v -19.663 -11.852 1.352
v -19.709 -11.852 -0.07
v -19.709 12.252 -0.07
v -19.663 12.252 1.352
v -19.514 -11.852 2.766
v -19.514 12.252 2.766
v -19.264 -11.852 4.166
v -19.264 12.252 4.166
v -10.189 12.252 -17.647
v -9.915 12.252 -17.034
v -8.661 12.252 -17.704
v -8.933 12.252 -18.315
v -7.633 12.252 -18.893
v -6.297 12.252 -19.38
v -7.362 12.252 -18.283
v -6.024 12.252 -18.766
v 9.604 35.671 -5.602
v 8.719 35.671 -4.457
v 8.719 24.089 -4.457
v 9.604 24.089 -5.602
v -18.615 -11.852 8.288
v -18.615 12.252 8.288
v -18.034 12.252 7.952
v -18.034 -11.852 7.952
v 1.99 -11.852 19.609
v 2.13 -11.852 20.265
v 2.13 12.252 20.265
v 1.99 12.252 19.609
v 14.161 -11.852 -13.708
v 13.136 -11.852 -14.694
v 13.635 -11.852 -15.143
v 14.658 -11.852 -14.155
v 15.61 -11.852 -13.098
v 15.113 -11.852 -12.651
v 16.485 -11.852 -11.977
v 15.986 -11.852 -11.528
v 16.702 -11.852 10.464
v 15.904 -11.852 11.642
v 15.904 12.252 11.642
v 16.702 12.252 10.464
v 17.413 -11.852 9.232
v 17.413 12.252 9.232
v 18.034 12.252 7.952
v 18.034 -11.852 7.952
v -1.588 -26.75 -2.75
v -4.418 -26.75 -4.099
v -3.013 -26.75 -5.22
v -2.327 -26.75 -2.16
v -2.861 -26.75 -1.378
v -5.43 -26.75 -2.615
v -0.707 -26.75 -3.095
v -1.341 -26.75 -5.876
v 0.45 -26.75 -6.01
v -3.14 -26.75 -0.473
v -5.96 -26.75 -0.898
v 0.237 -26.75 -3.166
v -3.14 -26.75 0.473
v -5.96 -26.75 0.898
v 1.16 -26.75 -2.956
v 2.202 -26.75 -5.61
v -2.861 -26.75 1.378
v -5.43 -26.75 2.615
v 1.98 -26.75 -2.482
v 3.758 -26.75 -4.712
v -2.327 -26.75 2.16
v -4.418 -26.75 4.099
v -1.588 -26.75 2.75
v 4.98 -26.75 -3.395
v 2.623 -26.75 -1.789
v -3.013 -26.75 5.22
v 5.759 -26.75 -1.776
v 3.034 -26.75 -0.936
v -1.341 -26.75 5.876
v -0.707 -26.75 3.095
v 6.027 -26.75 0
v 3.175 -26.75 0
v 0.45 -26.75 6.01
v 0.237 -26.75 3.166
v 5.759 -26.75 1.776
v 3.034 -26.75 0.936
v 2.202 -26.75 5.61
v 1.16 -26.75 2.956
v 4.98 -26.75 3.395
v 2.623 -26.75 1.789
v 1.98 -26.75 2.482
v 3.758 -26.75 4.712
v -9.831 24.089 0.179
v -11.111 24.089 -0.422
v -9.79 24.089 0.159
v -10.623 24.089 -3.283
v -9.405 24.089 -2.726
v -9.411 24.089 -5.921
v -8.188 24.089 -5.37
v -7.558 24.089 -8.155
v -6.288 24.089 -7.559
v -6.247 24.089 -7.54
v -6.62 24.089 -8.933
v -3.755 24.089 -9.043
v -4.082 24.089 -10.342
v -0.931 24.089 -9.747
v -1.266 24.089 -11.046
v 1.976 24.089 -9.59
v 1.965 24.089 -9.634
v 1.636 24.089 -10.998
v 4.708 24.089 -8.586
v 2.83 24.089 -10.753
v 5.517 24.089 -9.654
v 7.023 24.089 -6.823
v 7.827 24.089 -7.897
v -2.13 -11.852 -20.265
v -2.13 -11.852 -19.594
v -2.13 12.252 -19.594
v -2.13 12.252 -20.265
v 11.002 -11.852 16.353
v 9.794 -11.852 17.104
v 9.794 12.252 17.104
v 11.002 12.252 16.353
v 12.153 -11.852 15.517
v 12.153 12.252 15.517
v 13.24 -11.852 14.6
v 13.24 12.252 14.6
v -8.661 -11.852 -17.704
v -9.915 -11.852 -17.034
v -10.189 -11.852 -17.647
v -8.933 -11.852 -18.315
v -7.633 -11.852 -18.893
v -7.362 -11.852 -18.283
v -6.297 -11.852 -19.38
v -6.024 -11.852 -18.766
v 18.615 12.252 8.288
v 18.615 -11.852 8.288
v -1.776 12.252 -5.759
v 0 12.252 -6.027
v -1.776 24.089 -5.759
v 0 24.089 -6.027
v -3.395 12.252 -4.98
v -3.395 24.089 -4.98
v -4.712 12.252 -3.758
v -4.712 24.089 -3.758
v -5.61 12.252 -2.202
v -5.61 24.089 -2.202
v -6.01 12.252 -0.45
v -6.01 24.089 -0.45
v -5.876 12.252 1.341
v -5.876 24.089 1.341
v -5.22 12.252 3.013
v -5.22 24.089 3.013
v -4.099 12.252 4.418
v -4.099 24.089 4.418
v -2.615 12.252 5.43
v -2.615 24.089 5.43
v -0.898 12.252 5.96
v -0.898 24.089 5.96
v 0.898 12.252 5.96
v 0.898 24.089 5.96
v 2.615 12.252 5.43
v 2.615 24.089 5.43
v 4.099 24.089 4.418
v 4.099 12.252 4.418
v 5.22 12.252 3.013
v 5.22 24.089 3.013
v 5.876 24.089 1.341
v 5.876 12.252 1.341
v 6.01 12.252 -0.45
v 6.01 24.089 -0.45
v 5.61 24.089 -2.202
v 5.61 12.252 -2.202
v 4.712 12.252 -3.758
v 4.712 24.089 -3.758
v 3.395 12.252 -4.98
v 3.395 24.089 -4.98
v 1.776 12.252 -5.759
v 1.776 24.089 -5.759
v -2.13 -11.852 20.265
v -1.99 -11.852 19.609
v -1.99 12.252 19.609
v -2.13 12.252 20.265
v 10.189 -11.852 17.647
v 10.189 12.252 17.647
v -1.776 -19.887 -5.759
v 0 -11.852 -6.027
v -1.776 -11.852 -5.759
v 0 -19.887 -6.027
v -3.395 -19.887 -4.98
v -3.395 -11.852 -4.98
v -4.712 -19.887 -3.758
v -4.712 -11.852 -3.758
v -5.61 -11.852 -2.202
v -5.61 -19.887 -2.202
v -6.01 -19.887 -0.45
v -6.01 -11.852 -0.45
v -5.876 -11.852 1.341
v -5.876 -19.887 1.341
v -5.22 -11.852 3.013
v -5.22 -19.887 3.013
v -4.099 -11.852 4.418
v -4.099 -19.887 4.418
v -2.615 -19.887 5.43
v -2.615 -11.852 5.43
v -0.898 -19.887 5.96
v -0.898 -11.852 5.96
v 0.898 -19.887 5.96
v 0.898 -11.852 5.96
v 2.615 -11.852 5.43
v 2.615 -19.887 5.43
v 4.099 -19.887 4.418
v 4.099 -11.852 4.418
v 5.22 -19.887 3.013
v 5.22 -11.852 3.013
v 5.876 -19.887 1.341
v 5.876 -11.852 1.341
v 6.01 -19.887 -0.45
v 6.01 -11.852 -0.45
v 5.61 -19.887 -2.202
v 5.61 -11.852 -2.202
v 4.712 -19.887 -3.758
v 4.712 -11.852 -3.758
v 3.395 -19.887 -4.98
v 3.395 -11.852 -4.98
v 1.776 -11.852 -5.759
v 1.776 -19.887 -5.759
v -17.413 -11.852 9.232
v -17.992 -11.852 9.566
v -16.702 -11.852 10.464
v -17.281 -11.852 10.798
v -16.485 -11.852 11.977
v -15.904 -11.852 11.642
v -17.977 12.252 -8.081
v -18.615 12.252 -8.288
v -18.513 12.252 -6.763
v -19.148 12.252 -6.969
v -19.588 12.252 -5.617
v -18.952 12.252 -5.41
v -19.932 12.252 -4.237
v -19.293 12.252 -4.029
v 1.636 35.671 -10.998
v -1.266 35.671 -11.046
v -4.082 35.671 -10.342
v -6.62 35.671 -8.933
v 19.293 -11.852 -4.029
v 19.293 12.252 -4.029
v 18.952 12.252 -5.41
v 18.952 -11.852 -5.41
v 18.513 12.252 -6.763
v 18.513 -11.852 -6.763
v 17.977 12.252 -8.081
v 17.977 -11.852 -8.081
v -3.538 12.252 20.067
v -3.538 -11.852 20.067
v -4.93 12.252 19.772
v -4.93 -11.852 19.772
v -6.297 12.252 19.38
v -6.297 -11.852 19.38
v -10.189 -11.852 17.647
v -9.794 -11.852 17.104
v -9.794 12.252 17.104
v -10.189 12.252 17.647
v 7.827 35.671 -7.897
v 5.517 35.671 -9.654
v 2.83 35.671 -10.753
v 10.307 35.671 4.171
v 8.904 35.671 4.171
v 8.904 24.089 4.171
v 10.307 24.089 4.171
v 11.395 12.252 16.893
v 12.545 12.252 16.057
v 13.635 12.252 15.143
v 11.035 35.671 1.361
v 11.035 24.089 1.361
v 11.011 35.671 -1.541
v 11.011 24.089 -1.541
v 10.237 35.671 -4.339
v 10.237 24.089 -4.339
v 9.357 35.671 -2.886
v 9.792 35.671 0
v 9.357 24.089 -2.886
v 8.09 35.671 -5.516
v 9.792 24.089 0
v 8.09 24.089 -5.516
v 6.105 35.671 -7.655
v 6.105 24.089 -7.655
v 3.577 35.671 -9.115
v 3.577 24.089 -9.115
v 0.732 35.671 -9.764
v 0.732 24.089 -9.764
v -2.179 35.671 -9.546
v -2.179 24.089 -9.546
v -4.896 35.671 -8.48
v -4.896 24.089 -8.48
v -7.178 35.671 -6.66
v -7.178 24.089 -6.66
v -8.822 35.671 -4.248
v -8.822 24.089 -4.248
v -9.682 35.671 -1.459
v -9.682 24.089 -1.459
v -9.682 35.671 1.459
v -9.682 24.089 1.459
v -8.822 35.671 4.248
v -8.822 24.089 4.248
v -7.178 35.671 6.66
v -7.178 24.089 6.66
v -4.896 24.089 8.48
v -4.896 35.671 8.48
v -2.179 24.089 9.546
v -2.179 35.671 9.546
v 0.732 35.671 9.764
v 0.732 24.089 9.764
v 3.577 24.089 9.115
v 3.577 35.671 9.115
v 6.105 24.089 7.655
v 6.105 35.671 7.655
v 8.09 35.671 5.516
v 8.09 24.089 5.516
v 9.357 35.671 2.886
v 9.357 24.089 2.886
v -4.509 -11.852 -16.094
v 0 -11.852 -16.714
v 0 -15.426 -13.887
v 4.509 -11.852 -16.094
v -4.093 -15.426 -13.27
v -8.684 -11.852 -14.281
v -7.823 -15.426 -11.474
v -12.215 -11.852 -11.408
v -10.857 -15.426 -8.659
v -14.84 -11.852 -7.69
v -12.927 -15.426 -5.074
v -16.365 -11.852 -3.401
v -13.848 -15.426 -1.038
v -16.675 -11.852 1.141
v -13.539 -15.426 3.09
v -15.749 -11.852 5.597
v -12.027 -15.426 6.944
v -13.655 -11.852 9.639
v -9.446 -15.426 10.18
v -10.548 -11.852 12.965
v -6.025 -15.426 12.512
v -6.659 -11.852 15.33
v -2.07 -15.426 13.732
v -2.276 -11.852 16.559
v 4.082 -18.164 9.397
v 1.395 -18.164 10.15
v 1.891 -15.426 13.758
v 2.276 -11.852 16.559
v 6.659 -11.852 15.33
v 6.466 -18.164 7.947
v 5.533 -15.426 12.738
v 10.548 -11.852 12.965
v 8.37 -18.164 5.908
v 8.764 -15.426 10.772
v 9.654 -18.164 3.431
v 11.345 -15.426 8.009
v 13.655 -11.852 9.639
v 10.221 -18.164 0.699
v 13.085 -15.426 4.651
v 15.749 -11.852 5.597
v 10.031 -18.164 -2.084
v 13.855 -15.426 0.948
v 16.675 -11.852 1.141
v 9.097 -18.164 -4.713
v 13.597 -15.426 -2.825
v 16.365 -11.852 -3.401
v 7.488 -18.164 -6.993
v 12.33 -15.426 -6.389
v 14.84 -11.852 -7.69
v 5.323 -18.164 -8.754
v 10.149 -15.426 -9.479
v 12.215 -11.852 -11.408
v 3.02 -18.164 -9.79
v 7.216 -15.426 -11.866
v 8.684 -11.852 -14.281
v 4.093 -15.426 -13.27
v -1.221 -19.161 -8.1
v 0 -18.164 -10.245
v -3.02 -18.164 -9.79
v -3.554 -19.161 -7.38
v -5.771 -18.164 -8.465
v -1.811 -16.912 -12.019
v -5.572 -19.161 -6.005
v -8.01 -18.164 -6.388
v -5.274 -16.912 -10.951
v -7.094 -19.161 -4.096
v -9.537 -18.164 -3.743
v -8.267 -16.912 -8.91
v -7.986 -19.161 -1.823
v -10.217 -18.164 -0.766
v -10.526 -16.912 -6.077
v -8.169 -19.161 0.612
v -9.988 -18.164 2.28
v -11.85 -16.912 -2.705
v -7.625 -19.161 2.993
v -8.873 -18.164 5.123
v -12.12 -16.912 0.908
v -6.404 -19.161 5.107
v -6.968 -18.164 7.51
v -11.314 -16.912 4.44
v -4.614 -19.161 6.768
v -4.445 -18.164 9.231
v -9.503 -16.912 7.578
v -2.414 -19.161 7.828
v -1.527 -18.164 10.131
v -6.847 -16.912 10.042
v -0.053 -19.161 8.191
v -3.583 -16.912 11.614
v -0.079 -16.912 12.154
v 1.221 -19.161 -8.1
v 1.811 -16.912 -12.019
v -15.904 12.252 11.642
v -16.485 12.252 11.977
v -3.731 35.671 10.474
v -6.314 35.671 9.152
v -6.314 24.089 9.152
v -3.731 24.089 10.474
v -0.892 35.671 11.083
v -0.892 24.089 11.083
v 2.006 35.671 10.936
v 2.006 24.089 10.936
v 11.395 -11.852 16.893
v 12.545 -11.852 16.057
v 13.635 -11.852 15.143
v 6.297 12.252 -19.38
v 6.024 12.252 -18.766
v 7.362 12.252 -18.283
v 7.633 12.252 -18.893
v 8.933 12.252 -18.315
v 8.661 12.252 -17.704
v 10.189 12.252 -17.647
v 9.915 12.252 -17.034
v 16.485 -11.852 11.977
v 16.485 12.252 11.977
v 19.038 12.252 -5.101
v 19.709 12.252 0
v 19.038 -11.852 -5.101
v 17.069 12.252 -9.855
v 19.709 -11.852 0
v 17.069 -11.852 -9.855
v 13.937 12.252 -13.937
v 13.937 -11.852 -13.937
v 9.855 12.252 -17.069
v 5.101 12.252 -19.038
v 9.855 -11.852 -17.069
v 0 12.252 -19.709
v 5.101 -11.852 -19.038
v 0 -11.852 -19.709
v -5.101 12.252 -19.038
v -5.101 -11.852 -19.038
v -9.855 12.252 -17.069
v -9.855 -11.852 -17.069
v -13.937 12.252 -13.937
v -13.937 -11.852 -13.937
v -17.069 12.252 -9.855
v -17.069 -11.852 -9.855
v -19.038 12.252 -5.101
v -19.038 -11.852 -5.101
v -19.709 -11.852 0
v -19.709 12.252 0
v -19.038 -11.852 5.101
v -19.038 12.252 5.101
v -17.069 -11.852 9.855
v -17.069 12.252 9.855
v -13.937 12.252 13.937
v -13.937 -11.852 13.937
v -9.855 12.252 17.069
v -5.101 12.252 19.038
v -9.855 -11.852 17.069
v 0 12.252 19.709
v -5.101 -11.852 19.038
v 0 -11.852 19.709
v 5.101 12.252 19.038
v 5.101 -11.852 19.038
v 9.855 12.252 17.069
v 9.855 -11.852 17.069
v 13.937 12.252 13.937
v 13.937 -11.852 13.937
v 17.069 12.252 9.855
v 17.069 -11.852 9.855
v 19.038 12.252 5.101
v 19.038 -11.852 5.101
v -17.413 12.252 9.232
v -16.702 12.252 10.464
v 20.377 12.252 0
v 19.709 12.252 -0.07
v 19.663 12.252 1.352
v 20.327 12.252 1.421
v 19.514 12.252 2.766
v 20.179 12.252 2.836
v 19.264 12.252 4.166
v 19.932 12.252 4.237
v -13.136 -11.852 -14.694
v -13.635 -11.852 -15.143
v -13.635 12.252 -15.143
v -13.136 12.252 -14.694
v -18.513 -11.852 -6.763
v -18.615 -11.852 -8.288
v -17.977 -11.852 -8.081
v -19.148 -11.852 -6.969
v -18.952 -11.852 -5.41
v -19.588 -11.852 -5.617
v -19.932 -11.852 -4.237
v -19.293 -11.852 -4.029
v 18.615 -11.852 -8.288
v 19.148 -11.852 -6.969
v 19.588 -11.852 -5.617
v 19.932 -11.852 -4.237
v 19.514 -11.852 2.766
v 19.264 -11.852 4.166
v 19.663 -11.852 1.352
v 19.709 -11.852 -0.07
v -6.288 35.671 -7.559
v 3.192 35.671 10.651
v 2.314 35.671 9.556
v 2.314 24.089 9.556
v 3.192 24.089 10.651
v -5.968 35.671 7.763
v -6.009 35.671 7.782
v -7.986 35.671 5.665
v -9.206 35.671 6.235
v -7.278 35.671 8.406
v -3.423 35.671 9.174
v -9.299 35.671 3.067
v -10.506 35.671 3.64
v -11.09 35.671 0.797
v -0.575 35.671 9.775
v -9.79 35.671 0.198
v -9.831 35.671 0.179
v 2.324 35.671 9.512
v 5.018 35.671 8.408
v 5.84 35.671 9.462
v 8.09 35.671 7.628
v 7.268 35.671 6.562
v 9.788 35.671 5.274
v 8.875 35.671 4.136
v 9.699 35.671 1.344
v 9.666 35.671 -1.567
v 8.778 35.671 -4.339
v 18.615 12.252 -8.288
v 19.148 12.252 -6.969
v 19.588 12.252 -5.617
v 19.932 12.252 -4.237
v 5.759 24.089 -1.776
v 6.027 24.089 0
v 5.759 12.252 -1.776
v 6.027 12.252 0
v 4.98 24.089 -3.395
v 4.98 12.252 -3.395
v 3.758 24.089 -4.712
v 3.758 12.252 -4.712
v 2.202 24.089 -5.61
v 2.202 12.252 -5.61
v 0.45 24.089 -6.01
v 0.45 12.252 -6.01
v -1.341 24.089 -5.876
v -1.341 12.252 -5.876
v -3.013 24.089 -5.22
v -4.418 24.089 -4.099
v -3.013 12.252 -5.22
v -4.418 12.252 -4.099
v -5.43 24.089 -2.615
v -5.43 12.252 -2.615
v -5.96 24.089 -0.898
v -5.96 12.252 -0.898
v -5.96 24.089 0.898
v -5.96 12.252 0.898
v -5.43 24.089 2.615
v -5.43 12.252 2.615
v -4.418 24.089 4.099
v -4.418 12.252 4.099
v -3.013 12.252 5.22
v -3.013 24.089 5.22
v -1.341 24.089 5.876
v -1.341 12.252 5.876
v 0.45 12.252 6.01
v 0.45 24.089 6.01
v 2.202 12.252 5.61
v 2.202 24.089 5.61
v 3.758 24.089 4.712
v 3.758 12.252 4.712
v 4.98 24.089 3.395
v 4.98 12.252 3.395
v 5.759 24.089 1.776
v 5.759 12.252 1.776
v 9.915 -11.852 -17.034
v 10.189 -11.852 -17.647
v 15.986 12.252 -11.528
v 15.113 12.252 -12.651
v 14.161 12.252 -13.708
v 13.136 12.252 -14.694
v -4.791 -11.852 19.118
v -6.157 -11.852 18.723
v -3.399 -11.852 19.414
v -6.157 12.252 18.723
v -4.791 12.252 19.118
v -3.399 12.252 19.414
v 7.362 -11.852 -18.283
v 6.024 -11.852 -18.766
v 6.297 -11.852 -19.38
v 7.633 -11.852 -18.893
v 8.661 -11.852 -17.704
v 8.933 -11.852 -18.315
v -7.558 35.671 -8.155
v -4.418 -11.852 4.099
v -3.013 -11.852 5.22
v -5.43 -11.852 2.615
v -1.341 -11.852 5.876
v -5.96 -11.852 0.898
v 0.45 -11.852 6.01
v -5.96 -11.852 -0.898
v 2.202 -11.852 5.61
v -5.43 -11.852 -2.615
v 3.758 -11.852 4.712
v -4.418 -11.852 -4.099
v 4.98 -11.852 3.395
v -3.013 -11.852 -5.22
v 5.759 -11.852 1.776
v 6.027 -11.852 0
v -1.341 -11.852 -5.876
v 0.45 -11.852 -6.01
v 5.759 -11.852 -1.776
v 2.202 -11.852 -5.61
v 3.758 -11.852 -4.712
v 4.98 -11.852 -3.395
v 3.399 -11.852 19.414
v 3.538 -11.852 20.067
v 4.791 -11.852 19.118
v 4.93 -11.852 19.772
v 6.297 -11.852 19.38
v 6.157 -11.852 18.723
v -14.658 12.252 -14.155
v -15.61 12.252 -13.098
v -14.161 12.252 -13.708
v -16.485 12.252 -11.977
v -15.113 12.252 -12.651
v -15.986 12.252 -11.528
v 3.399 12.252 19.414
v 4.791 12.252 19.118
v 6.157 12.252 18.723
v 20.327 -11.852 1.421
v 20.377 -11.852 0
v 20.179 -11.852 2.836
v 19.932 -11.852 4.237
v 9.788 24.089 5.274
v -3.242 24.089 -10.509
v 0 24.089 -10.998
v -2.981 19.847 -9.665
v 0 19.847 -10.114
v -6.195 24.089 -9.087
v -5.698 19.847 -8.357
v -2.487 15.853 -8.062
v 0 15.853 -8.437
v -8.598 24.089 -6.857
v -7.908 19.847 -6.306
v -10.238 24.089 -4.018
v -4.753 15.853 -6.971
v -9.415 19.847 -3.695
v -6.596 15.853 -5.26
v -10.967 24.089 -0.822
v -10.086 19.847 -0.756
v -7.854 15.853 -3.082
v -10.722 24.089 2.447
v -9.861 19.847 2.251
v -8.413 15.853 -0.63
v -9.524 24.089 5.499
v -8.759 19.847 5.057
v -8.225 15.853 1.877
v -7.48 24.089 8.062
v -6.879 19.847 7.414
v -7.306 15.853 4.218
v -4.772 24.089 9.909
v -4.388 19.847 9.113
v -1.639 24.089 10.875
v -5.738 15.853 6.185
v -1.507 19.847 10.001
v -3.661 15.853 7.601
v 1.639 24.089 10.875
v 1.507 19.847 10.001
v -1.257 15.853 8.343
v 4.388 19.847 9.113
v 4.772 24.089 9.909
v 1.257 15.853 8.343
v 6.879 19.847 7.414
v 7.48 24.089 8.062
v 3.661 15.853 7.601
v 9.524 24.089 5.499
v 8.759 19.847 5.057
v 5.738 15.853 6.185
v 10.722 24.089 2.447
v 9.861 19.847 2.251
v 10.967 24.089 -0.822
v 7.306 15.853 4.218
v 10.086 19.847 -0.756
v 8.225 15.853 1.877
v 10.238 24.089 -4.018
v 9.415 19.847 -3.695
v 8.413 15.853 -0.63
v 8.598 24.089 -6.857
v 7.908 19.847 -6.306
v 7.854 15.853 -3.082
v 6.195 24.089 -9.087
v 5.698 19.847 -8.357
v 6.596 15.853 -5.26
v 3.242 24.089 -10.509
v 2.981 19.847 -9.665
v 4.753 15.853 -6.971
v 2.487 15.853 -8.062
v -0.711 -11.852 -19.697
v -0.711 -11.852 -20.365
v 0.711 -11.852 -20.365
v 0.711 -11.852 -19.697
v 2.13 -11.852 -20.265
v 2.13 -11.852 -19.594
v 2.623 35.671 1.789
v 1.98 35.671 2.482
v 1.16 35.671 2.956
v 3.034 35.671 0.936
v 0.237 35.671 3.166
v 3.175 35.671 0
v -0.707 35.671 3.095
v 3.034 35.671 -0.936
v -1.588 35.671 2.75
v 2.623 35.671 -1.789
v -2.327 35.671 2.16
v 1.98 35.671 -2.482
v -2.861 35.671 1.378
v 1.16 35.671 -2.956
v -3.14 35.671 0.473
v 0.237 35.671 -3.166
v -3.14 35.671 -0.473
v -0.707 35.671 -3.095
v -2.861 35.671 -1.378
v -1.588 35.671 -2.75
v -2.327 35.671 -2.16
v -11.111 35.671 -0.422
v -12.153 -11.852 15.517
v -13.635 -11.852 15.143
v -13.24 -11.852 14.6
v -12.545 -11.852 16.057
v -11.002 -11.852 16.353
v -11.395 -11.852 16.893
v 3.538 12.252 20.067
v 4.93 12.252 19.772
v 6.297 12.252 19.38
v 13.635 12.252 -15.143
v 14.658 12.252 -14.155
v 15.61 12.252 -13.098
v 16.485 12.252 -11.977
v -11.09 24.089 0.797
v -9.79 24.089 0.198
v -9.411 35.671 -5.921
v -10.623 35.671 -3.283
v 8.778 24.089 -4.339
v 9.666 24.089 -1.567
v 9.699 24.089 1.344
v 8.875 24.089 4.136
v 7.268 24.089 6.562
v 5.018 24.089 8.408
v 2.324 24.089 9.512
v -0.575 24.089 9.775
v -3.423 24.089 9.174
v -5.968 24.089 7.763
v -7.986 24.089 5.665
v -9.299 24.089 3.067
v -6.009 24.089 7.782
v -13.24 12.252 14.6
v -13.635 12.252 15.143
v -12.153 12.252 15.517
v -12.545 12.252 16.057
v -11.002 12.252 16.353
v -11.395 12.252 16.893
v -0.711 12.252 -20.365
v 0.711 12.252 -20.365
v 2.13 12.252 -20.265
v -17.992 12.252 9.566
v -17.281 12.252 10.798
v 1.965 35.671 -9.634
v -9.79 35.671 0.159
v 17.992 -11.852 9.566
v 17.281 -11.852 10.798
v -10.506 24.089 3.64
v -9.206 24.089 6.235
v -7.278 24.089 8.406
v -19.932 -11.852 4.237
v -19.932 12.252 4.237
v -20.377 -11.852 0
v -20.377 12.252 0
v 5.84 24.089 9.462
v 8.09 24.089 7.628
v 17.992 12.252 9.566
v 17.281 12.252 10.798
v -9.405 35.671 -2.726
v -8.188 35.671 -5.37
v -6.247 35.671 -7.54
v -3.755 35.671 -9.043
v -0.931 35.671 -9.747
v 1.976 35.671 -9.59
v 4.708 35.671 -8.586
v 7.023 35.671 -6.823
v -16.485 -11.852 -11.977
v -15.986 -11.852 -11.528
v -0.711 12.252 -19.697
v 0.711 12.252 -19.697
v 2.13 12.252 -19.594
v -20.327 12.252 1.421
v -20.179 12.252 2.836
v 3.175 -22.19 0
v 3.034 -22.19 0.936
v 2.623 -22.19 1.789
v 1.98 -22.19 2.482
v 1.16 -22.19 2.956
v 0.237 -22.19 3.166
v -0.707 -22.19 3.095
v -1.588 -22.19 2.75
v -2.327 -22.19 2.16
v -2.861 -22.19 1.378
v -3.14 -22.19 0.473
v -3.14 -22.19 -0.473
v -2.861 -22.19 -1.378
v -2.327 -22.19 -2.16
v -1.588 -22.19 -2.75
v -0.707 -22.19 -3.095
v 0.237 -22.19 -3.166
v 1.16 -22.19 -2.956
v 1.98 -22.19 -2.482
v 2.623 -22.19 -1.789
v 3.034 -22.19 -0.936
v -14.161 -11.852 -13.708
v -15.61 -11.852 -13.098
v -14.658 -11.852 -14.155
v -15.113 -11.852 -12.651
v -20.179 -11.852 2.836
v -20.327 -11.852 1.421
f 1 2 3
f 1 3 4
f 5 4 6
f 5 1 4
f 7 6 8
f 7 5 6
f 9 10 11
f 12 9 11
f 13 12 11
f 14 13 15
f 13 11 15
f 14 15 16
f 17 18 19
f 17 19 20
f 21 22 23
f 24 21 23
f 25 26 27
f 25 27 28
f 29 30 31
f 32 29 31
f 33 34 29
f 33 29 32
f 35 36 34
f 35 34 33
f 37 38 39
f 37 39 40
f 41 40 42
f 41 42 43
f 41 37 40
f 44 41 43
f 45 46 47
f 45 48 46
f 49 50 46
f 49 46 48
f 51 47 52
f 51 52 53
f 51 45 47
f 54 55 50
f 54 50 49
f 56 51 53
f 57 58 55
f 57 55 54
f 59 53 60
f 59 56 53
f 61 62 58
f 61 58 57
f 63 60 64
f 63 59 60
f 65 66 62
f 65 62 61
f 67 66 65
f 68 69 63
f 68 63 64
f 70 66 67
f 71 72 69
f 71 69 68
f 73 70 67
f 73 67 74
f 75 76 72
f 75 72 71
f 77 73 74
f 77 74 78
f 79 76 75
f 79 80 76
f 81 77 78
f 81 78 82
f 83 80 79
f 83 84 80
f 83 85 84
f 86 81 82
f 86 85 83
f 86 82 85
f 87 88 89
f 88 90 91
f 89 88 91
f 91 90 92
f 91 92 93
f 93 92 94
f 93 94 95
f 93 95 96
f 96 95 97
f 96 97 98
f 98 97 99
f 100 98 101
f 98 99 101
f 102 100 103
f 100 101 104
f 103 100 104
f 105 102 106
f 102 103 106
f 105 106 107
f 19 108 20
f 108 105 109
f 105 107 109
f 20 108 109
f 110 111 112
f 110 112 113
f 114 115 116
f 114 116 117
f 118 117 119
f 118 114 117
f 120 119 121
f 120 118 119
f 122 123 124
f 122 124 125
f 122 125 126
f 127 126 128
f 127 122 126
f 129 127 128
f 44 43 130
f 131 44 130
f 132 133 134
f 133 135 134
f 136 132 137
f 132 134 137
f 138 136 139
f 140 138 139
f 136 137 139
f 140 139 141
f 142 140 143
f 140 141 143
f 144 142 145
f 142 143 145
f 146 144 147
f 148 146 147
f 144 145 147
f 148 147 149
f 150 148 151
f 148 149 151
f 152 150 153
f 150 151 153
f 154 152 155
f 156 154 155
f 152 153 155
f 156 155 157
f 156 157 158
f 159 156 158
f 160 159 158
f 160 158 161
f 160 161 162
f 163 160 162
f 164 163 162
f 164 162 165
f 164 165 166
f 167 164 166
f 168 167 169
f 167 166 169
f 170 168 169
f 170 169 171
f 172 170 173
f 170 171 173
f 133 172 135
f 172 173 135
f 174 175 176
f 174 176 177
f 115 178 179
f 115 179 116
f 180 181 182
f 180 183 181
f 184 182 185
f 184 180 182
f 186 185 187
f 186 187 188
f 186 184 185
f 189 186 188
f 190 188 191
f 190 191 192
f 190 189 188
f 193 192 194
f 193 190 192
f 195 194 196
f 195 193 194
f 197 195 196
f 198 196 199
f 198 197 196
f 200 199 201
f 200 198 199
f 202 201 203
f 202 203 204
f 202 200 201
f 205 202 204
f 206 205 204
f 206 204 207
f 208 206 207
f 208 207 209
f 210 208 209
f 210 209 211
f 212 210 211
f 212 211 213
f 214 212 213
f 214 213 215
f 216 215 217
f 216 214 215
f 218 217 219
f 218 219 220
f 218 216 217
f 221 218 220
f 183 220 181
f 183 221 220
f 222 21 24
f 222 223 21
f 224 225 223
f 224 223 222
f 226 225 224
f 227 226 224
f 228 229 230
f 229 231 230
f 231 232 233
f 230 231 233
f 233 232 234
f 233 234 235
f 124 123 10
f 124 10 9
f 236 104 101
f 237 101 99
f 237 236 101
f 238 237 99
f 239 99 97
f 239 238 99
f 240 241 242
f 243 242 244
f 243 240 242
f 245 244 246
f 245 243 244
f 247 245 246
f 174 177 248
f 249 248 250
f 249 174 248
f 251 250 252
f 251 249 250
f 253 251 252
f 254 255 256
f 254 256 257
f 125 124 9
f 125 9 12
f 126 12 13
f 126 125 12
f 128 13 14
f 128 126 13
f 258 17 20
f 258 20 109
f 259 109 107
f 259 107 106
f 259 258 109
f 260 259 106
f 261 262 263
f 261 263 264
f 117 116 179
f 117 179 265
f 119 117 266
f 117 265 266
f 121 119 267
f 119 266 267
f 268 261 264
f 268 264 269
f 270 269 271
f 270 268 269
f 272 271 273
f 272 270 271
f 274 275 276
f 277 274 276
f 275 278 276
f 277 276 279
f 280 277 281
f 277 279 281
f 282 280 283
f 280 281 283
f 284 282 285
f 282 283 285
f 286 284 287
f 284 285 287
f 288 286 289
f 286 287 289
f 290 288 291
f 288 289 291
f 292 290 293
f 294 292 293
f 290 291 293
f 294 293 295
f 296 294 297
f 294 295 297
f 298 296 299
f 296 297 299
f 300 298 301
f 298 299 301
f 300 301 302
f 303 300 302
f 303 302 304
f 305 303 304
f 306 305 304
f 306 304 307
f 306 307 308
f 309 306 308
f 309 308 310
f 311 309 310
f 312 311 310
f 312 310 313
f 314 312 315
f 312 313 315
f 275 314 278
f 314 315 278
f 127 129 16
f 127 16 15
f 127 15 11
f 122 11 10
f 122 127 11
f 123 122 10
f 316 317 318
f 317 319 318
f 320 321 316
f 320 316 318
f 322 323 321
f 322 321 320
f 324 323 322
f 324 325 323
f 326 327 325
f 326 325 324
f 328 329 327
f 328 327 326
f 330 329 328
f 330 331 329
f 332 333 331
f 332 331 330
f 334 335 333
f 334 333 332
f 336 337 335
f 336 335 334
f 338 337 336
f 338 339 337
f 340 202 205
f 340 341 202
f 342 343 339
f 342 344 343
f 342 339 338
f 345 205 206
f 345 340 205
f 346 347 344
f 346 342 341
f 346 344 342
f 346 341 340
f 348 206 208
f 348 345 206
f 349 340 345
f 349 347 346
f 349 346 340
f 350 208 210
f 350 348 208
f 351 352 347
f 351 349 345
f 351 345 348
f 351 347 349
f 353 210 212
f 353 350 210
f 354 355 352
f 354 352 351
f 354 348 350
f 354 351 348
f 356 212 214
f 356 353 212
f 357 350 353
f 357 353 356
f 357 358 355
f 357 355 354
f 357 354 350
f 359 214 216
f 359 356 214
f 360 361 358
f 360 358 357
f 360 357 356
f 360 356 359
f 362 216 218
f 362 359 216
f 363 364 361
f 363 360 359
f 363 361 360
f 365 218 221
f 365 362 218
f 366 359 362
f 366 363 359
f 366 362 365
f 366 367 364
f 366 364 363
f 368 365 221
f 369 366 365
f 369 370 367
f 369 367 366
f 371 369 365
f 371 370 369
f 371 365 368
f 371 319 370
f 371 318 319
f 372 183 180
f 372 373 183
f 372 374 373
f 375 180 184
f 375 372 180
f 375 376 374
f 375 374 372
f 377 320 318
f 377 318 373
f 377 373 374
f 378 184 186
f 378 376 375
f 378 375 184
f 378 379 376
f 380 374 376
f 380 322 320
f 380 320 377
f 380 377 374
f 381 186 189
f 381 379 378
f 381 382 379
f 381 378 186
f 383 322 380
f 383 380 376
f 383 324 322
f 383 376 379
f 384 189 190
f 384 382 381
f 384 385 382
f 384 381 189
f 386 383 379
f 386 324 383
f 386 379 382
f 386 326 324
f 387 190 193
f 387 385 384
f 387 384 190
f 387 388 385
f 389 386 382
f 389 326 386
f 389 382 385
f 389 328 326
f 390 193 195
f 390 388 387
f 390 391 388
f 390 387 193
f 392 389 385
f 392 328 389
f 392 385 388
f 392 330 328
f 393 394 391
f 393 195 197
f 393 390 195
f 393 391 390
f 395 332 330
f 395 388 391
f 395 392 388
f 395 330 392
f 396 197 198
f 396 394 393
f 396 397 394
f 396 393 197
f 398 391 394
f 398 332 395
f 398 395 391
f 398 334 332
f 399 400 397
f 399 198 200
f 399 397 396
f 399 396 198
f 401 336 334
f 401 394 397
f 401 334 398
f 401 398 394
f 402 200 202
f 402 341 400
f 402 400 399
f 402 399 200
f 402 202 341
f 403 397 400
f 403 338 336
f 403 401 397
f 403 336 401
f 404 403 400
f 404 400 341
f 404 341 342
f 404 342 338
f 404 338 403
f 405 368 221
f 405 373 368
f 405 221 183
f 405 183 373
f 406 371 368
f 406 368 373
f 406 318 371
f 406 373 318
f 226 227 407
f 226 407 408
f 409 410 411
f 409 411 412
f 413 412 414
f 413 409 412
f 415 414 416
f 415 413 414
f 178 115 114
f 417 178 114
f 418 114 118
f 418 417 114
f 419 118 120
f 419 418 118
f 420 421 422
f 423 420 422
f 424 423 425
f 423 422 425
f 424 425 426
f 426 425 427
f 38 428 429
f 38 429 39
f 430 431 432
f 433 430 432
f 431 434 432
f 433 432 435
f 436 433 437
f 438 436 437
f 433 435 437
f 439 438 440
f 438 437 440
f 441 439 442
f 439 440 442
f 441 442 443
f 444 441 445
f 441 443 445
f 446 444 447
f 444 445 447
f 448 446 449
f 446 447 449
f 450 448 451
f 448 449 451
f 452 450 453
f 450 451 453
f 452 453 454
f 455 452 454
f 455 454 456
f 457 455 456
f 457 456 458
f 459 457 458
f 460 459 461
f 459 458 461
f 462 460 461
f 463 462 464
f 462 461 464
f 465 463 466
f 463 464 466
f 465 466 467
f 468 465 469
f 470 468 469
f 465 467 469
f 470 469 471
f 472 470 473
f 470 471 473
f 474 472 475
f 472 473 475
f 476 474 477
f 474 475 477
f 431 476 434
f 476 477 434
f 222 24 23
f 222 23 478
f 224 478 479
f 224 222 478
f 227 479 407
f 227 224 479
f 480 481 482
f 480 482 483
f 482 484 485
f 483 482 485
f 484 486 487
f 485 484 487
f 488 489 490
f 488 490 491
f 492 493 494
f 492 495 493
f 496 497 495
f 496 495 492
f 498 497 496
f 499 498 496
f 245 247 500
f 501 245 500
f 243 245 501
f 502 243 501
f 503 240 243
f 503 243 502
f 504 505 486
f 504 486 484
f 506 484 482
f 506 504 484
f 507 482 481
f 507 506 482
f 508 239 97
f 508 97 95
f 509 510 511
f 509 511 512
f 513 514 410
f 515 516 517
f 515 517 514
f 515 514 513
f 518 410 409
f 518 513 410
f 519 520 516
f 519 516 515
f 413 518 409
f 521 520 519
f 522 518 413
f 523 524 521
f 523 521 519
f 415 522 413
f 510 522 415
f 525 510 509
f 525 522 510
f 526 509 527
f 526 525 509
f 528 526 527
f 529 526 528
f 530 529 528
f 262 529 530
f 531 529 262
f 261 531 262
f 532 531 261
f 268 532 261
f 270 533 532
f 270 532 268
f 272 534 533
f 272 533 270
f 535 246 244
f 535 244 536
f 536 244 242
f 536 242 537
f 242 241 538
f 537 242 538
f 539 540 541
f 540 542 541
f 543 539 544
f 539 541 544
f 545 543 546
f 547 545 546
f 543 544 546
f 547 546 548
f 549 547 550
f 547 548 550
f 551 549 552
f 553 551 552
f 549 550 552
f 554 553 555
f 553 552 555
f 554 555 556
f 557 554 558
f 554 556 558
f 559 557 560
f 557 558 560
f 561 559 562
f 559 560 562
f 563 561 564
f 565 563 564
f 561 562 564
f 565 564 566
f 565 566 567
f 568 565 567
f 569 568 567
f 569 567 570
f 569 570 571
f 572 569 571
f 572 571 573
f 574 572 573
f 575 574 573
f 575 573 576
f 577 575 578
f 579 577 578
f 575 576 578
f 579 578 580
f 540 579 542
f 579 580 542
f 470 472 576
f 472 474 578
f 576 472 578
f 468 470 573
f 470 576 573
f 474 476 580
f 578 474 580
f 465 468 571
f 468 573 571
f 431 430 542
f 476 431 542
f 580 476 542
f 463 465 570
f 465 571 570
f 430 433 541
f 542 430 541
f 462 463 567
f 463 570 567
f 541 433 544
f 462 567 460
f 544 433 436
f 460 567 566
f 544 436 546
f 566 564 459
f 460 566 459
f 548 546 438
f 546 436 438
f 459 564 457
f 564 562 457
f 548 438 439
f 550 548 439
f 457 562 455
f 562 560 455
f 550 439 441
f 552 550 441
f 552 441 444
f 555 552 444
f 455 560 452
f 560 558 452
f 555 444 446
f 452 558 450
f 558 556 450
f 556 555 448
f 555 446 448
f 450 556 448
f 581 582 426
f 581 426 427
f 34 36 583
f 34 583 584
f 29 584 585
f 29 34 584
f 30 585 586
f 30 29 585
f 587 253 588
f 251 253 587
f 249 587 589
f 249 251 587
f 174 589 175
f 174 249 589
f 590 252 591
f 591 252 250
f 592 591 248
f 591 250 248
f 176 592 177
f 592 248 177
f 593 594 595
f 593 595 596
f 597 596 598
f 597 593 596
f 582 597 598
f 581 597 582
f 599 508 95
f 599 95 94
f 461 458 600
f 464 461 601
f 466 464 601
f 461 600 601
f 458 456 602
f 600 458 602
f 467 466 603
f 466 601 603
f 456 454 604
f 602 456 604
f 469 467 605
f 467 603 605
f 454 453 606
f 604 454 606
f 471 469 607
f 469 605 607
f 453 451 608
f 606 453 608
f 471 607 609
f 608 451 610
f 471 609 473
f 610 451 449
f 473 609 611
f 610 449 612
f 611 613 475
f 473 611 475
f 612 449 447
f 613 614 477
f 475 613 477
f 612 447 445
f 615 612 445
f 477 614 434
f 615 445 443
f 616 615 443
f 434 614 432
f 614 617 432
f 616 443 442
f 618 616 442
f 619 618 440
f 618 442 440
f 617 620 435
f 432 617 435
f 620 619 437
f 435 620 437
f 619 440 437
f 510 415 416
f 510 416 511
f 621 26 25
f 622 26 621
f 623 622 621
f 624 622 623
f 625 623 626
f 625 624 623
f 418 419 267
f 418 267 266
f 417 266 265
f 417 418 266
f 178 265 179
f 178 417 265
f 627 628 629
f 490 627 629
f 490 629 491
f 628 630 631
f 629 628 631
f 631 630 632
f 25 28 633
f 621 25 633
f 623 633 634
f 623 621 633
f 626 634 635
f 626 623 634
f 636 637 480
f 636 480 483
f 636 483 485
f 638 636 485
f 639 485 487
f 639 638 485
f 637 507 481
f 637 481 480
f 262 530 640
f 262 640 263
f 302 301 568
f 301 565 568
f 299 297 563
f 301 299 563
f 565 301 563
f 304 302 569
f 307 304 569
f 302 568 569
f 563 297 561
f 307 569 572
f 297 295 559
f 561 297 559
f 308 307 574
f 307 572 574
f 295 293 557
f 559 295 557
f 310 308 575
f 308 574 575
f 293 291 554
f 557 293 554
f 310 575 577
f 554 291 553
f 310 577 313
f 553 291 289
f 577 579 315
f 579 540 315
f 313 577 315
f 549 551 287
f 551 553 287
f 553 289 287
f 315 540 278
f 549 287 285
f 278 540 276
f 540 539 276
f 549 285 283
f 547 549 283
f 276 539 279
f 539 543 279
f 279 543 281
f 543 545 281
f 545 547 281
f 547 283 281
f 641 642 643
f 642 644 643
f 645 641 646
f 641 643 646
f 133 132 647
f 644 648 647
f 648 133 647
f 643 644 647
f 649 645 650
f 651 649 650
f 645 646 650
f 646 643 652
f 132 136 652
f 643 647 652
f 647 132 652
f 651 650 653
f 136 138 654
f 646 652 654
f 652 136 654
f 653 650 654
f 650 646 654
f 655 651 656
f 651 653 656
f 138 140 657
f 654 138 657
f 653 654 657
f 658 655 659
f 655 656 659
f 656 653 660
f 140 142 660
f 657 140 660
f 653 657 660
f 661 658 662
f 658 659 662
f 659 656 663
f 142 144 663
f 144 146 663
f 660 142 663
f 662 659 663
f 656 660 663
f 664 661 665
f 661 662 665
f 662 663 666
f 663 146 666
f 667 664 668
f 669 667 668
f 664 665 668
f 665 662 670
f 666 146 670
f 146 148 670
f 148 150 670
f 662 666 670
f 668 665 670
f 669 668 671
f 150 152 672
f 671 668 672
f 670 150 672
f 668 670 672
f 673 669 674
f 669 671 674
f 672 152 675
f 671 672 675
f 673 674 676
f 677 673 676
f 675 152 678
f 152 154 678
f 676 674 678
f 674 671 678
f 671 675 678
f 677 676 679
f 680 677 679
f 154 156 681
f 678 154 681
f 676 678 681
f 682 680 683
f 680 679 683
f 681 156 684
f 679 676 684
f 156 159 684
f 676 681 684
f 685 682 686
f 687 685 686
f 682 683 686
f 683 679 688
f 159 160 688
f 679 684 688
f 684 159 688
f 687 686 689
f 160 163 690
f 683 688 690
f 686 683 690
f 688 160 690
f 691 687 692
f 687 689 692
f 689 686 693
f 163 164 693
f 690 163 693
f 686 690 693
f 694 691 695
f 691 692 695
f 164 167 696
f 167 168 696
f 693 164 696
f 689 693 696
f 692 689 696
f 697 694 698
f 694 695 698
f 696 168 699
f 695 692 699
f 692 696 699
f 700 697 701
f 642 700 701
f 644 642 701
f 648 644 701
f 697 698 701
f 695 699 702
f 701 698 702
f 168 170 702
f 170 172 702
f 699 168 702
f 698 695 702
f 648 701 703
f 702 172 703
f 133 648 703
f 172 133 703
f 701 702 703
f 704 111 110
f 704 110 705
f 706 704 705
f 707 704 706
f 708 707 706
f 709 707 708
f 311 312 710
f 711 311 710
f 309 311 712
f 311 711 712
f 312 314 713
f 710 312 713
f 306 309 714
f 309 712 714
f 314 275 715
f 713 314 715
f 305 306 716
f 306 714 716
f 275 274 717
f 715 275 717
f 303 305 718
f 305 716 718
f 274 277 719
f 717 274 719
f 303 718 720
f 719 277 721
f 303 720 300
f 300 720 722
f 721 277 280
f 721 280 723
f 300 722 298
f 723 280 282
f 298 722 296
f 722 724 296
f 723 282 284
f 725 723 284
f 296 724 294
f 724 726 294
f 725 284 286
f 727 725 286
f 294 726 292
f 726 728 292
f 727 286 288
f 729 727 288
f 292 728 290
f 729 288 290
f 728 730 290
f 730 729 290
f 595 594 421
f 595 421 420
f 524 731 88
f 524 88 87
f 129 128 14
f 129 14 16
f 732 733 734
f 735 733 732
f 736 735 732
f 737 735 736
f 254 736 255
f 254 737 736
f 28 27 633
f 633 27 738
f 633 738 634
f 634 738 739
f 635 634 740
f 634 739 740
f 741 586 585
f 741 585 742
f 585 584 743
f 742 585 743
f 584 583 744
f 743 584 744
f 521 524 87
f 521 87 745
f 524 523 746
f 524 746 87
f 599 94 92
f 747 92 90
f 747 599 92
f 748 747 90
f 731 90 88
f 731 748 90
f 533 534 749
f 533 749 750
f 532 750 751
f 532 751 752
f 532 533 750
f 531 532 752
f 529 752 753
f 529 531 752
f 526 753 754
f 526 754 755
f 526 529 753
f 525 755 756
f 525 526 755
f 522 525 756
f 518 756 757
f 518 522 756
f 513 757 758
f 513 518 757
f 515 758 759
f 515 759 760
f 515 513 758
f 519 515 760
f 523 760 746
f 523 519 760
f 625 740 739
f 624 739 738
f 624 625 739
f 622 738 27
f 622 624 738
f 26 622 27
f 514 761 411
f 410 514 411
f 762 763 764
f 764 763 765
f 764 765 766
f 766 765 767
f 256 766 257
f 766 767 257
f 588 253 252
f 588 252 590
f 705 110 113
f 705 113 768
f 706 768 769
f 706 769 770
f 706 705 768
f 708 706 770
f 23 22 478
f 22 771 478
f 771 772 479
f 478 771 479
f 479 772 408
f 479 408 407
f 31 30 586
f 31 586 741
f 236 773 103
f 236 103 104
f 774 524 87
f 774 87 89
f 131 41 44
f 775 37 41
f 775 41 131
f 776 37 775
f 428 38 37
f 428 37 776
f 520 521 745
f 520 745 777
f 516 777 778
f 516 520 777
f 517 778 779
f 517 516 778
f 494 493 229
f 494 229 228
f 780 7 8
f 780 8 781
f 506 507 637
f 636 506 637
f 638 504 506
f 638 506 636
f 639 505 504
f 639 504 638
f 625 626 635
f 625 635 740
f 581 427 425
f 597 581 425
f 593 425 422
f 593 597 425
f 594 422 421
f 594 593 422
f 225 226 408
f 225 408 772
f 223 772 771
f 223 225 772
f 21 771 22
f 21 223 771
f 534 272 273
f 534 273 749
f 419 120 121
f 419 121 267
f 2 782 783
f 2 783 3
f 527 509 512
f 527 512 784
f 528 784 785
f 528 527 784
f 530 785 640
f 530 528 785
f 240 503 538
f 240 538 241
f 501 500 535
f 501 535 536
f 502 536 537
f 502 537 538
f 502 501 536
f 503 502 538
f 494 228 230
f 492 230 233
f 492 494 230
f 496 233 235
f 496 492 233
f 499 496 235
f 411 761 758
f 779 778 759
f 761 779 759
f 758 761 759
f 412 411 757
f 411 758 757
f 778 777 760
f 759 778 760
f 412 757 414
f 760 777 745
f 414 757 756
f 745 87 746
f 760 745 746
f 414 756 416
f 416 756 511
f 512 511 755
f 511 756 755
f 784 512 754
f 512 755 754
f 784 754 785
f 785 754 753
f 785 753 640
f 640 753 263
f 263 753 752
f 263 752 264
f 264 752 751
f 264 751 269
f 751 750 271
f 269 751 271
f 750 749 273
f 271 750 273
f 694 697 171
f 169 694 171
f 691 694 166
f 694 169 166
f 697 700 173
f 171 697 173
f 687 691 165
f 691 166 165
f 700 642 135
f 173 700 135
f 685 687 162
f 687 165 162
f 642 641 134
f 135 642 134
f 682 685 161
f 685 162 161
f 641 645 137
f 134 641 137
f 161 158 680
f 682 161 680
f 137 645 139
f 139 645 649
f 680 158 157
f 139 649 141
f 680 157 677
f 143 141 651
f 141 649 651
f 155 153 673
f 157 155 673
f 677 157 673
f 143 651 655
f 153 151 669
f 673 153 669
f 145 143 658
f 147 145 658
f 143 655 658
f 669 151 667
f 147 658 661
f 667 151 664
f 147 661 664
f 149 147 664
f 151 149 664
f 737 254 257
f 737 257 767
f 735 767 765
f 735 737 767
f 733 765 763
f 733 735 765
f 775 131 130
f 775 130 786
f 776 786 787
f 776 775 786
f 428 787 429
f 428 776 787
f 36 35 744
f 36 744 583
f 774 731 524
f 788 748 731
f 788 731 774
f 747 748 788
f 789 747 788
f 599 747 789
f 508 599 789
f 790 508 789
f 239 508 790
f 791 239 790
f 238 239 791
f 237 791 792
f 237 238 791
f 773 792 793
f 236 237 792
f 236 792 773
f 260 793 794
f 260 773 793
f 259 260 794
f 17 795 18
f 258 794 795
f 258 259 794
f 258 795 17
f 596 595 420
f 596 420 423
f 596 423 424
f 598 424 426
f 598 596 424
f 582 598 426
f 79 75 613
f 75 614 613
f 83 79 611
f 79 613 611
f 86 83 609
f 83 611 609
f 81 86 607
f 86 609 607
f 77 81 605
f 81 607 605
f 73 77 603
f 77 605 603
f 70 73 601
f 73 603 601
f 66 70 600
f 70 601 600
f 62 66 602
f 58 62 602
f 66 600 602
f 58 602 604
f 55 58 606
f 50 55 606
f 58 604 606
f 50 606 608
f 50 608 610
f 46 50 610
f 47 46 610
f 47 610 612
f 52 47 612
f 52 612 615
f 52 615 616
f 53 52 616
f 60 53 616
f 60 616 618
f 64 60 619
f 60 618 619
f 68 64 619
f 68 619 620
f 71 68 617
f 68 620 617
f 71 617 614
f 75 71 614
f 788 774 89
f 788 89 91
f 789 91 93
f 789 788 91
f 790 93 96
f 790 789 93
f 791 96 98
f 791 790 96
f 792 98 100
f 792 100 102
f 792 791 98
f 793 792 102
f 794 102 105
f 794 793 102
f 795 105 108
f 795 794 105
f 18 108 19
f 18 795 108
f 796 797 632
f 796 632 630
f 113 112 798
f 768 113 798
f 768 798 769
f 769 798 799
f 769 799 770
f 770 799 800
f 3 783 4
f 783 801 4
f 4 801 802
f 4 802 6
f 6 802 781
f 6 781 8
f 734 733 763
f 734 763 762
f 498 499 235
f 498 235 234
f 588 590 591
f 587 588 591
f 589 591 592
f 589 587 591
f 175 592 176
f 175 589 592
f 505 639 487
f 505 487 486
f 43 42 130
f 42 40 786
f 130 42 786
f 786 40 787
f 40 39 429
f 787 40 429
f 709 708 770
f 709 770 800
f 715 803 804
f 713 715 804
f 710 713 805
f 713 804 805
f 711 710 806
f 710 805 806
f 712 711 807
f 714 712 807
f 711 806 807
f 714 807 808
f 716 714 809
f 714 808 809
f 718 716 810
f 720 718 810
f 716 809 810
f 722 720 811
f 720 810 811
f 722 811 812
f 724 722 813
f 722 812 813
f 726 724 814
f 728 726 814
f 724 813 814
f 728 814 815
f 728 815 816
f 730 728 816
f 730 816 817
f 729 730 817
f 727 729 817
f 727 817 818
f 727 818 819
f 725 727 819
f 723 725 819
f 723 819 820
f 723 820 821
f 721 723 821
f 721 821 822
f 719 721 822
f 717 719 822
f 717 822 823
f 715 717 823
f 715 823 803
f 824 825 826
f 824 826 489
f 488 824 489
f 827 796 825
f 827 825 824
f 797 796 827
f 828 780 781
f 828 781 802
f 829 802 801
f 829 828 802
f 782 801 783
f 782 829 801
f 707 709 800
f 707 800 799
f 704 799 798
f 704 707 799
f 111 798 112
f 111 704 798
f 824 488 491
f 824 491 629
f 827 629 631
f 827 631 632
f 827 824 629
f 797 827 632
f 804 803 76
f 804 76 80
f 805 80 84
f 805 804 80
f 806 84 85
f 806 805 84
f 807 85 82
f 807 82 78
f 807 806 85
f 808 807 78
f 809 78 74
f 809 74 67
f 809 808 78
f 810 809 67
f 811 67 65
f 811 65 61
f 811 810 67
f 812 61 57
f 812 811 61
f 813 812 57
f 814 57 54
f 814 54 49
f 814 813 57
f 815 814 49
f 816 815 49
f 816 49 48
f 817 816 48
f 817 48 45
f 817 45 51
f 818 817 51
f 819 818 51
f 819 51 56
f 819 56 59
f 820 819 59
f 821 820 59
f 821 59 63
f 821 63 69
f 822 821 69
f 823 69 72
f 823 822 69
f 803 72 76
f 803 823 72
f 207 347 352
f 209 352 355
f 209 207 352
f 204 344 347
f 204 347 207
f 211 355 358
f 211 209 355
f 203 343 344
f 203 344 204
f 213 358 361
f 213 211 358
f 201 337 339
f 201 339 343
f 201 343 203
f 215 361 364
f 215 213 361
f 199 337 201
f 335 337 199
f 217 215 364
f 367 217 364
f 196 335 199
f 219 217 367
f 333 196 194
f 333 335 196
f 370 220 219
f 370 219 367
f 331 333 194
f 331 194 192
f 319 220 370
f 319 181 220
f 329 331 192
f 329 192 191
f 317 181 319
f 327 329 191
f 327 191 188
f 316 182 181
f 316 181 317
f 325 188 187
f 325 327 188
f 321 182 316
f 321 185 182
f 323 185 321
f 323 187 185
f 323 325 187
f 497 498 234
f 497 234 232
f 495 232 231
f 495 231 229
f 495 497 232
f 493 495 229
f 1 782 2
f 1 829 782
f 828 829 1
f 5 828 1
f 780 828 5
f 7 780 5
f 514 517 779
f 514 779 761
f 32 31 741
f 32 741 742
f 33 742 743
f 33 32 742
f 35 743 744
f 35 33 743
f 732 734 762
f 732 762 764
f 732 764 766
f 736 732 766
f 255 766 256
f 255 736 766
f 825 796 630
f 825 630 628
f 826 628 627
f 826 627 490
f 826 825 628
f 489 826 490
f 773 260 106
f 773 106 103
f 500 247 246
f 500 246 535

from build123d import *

# Parameters (mm, degrees)
SKETCH2_R               = 3.175
CUT_EXTRUDE1_DEPTH      = 1
CUT_EXTRUDE1_DEPTH_BACK = 58.8612
BOSS_EXTRUDE2_DEPTH     = 24.1046
BOSS_EXTRUDE2_2_DEPTH   = 24.1046
BOSS_EXTRUDE2_3_DEPTH   = 24.1046
BOSS_EXTRUDE2_4_DEPTH   = 24.1046
BOSS_EXTRUDE2_5_DEPTH   = 24.1046
BOSS_EXTRUDE2_6_DEPTH   = 24.1046
BOSS_EXTRUDE2_7_DEPTH   = 24.1046
BOSS_EXTRUDE2_8_DEPTH   = 24.1046
BOSS_EXTRUDE2_9_DEPTH   = 24.1046
BOSS_EXTRUDE2_10_DEPTH  = 24.1046
BOSS_EXTRUDE2_11_DEPTH  = 24.1046
BOSS_EXTRUDE2_12_DEPTH  = 24.1046
BOSS_EXTRUDE2_13_DEPTH  = 24.1046
BOSS_EXTRUDE2_14_DEPTH  = 24.1046
BOSS_EXTRUDE2_15_DEPTH  = 24.1046
BOSS_EXTRUDE4_DEPTH     = 11.5824
BOSS_EXTRUDE4_2_DEPTH   = 11.5824
SKETCH7_R               = 6.02698233
SKETCH7_R_2             = 3.175
BOSS_EXTRUDE5_DEPTH     = 4.5593


with BuildPart() as part:
    # Sketch1 → Revolve1 (revolve)
    with BuildSketch(Plane.XY):
        Polygon((3.398475252, -22.190292446), (0, -22.190292446), (0, 35.670907554), (9.7917, 35.670907554), (9.7917, 24.088507554), (6.02698233, 24.088507554), (6.02698233, 12.252107554), (19.709387233, 12.252107554), (19.709387233, -11.852492446), (6.02698233, -11.852492446), (6.02698233, -22.190292446), align=None)
    revolve(axis=Axis((0, -22.190292446, 0), (0, 1, 0)))

    # Sketch2 → Cut-Extrude1 (cut, two sides)
    with BuildSketch(Plane.XZ.offset(22.190292446)) as cut_extrude1_sk:
        Circle(SKETCH2_R)
    extrude(amount=CUT_EXTRUDE1_DEPTH, mode=Mode.SUBTRACT)
    extrude(cut_extrude1_sk.sketch, amount=-CUT_EXTRUDE1_DEPTH_BACK, mode=Mode.SUBTRACT)

    # Sketch7 → Boss-Extrude5 (add)
    with BuildSketch(Plane.XZ.offset(22.190292446)):
        Circle(SKETCH7_R)
        Circle(SKETCH7_R_2, mode=Mode.SUBTRACT)
    extrude(amount=BOSS_EXTRUDE5_DEPTH)


with BuildPart() as body_2:
    # Sketch3 → Boss-Extrude2 (new body)
    with BuildSketch(Plane.XZ.offset(11.852492446)):
        with BuildLine():
            Line((2.129978383, -20.26539062), (2.129978383, -19.59395665))
            ThreePointArc((2.129978383, -19.59395665), (0, -19.709387233), (-2.129978383, -19.59395665))
            Line((-2.129978383, -19.59395665), (-2.129978383, -20.26539062))
            ThreePointArc((-2.129978383, -20.26539062), (0, -20.377018057), (2.129978383, -20.26539062))
        make_face()
    extrude(amount=-BOSS_EXTRUDE2_DEPTH)


with BuildPart() as body_3:
    # Sketch3 → Boss-Extrude2 2 (new body)
    with BuildSketch(Plane.XZ.offset(11.852492446)):
        with BuildLine():
            Line((-6.296844874, -19.379695806), (-6.023748075, -18.766310352))
            ThreePointArc((-6.023748075, -18.766310352), (-8.01653, -18.00542118), (-9.915412229, -17.033629837))
            Line((-9.915412229, -17.033629837), (-10.188509029, -17.647015291))
            ThreePointArc((-10.188509029, -17.647015291), (-8.28807992, -18.615332286), (-6.296844874, -19.379695806))
        make_face()
    extrude(amount=-BOSS_EXTRUDE2_2_DEPTH)


with BuildPart() as body_4:
    # Sketch3 → Boss-Extrude2 3 (new body)
    with BuildSketch(Plane.XZ.offset(11.852492446)):
        with BuildLine():
            Line((-13.634886448, -15.143075528), (-13.135913768, -14.693798508))
            ThreePointArc((-13.135913768, -14.693798508), (-14.646929136, -13.18815423), (-15.986381222, -11.52803368))
            Line((-15.986381222, -11.52803368), (-16.485353903, -11.9773107))
            ThreePointArc((-16.485353903, -11.9773107), (-15.143075528, -13.634886448), (-13.634886448, -15.143075528))
        make_face()
    extrude(amount=-BOSS_EXTRUDE2_3_DEPTH)


with BuildPart() as body_5:
    # Sketch3 → Boss-Extrude2 4 (new body)
    with BuildSketch(Plane.XZ.offset(11.852492446)):
        with BuildLine():
            Line((-18.615332286, -8.28807992), (-17.976760633, -8.080595413))
            ThreePointArc((-17.976760633, -8.080595413), (-18.74474116, -6.090535604), (-19.29315967, -4.029135771))
            Line((-19.29315967, -4.029135771), (-19.931731323, -4.236620278))
            ThreePointArc((-19.931731323, -4.236620278), (-19.379695806, -6.296844874), (-18.615332286, -8.28807992))
        make_face()
    extrude(amount=-BOSS_EXTRUDE2_4_DEPTH)


with BuildPart() as body_6:
    # Sketch3 → Boss-Extrude2 5 (new body)
    with BuildSketch(Plane.XZ.offset(11.852492446)):
        with BuildLine():
            Line((-20.377018057, 0), (-19.709262272, -0.070183961))
            ThreePointArc((-19.709262272, -0.070183961), (-19.601417148, 2.060191959), (-19.263975538, 4.166436317))
            Line((-19.263975538, 4.166436317), (-19.931731323, 4.236620278))
            ThreePointArc((-19.931731323, 4.236620278), (-20.26539062, 2.129978383), (-20.377018057, 0))
        make_face()
    extrude(amount=-BOSS_EXTRUDE2_5_DEPTH)


with BuildPart() as body_7:
    # Sketch3 → Boss-Extrude2 6 (new body)
    with BuildSketch(Plane.XZ.offset(11.852492446)):
        with BuildLine():
            Line((-18.615332286, 8.28807992), (-18.033853411, 7.952362935))
            ThreePointArc((-18.033853411, 7.952362935), (-17.068830037, 9.854693617), (-15.903875027, 11.641593714))
            Line((-15.903875027, 11.641593714), (-16.485353903, 11.9773107))
            ThreePointArc((-16.485353903, 11.9773107), (-17.647015291, 10.188509029), (-18.615332286, 8.28807992))
        make_face()
    extrude(amount=-BOSS_EXTRUDE2_6_DEPTH)


with BuildPart() as body_8:
    # Sketch3 → Boss-Extrude2 7 (new body)
    with BuildSketch(Plane.XZ.offset(11.852492446)):
        with BuildLine():
            Line((-13.634886448, 15.143075528), (-13.240227463, 14.599874035))
            ThreePointArc((-13.240227463, 14.599874035), (-11.584887147, 15.94522922), (-9.793850043, 17.103813798))
            Line((-9.793850043, 17.103813798), (-10.188509029, 17.647015291))
            ThreePointArc((-10.188509029, 17.647015291), (-11.9773107, 16.485353903), (-13.634886448, 15.143075528))
        make_face()
    extrude(amount=-BOSS_EXTRUDE2_7_DEPTH)


with BuildPart() as body_9:
    # Sketch3 → Boss-Extrude2 8 (new body)
    with BuildSketch(Plane.XZ.offset(11.852492446)):
        with BuildLine():
            Line((-6.296844874, 19.379695806), (-6.157245902, 18.722934279))
            ThreePointArc((-6.157245902, 18.722934279), (-4.097812025, 19.278689834), (-1.990379411, 19.608629093))
            Line((-1.990379411, 19.608629093), (-2.129978383, 20.26539062))
            ThreePointArc((-2.129978383, 20.26539062), (-4.236620278, 19.931731323), (-6.296844874, 19.379695806))
        make_face()
    extrude(amount=-BOSS_EXTRUDE2_8_DEPTH)


with BuildPart() as body_10:
    # Sketch3 → Boss-Extrude2 9 (new body)
    with BuildSketch(Plane.XZ.offset(11.852492446)):
        with BuildLine():
            Line((2.129978383, 20.26539062), (1.990379411, 19.608629093))
            ThreePointArc((1.990379411, 19.608629093), (4.097812025, 19.278689834), (6.157245902, 18.722934279))
            Line((6.157245902, 18.722934279), (6.296844874, 19.379695806))
            ThreePointArc((6.296844874, 19.379695806), (4.236620278, 19.931731323), (2.129978383, 20.26539062))
        make_face()
    extrude(amount=-BOSS_EXTRUDE2_9_DEPTH)


with BuildPart() as body_11:
    # Sketch3 → Boss-Extrude2 10 (new body)
    with BuildSketch(Plane.XZ.offset(11.852492446)):
        with BuildLine():
            Line((10.188509029, 17.647015291), (9.793850043, 17.103813798))
            ThreePointArc((9.793850043, 17.103813798), (11.584887147, 15.94522922), (13.240227463, 14.599874035))
            Line((13.240227463, 14.599874035), (13.634886448, 15.143075528))
            ThreePointArc((13.634886448, 15.143075528), (11.9773107, 16.485353903), (10.188509029, 17.647015291))
        make_face()
    extrude(amount=-BOSS_EXTRUDE2_10_DEPTH)


with BuildPart() as body_12:
    # Sketch3 → Boss-Extrude2 11 (new body)
    with BuildSketch(Plane.XZ.offset(11.852492446)):
        with BuildLine():
            Line((16.485353903, 11.9773107), (15.903875027, 11.641593714))
            ThreePointArc((15.903875027, 11.641593714), (17.068830037, 9.854693617), (18.033853411, 7.952362935))
            Line((18.033853411, 7.952362935), (18.615332286, 8.28807992))
            ThreePointArc((18.615332286, 8.28807992), (17.647015291, 10.188509029), (16.485353903, 11.9773107))
        make_face()
    extrude(amount=-BOSS_EXTRUDE2_11_DEPTH)


with BuildPart() as body_13:
    # Sketch3 → Boss-Extrude2 12 (new body)
    with BuildSketch(Plane.XZ.offset(11.852492446)):
        with BuildLine():
            Line((19.931731323, 4.236620278), (19.263975538, 4.166436317))
            ThreePointArc((19.263975538, 4.166436317), (19.601417148, 2.060191959), (19.709262272, -0.070183961))
            Line((19.709262272, -0.070183961), (20.377018057, 0))
            ThreePointArc((20.377018057, 0), (20.26539062, 2.129978383), (19.931731323, 4.236620278))
        make_face()
    extrude(amount=-BOSS_EXTRUDE2_12_DEPTH)


with BuildPart() as body_14:
    # Sketch3 → Boss-Extrude2 13 (new body)
    with BuildSketch(Plane.XZ.offset(11.852492446)):
        with BuildLine():
            Line((19.931731323, -4.236620278), (19.29315967, -4.029135771))
            ThreePointArc((19.29315967, -4.029135771), (18.74474116, -6.090535604), (17.976760633, -8.080595413))
            Line((17.976760633, -8.080595413), (18.615332286, -8.28807992))
            ThreePointArc((18.615332286, -8.28807992), (19.379695806, -6.296844874), (19.931731323, -4.236620278))
        make_face()
    extrude(amount=-BOSS_EXTRUDE2_13_DEPTH)


with BuildPart() as body_15:
    # Sketch3 → Boss-Extrude2 14 (new body)
    with BuildSketch(Plane.XZ.offset(11.852492446)):
        with BuildLine():
            Line((16.485353903, -11.9773107), (15.986381222, -11.52803368))
            ThreePointArc((15.986381222, -11.52803368), (14.646929136, -13.18815423), (13.135913768, -14.693798508))
            Line((13.135913768, -14.693798508), (13.634886448, -15.143075528))
            ThreePointArc((13.634886448, -15.143075528), (15.143075528, -13.634886448), (16.485353903, -11.9773107))
        make_face()
    extrude(amount=-BOSS_EXTRUDE2_14_DEPTH)


with BuildPart() as body_16:
    # Sketch3 → Boss-Extrude2 15 (new body)
    with BuildSketch(Plane.XZ.offset(11.852492446)):
        with BuildLine():
            Line((10.188509029, -17.647015291), (9.915412229, -17.033629837))
            ThreePointArc((9.915412229, -17.033629837), (8.01653, -18.00542118), (6.023748075, -18.766310352))
            Line((6.023748075, -18.766310352), (6.296844874, -19.379695806))
            ThreePointArc((6.296844874, -19.379695806), (8.28807992, -18.615332286), (10.188509029, -17.647015291))
        make_face()
    extrude(amount=-BOSS_EXTRUDE2_15_DEPTH)


with BuildPart() as body_17:
    # Sketch4 → Boss-Extrude4 (new body)
    with BuildSketch(Plane(origin=(0, 35.670907554, 0), x_dir=(1, 0, 0), z_dir=(0, 1, 0))):
        with BuildLine():
            Line((10.237362125, 4.338695071), (8.777990315, 4.338695071))
            ThreePointArc((8.777990315, 4.338695071), (2.324089523, -9.51188713), (-9.789696969, -0.19804584))
            Line((-9.789696969, -0.19804584), (-9.830682257, -0.178809531))
            Line((-9.830682257, -0.178809531), (-11.090204264, -0.79701165))
            ThreePointArc((-11.090204264, -0.79701165), (-9.941009577, -4.980380184), (-7.278386297, -8.405530982))
            Line((-7.278386297, -8.405530982), (-6.008954103, -7.782464717))
            Line((-6.008954103, -7.782464717), (-6.314338707, -9.151884226))
            ThreePointArc((-6.314338707, -9.151884226), (-2.331413825, -10.87163133), (2.006447678, -10.936271115))
            Line((2.006447678, -10.936271115), (2.314235113, -9.556076723))
            Line((2.314235113, -9.556076723), (3.191759322, -10.650846474))
            ThreePointArc((3.191759322, -10.650846474), (7.024703597, -8.618665649), (9.788200428, -5.274371107))
            Line((9.788200428, -5.274371107), (8.903771672, -4.170987474))
            Line((8.903771672, -4.170987474), (10.306828886, -4.170987474))
            ThreePointArc((10.306828886, -4.170987474), (11.118436056, 0.090762698), (10.237362125, 4.338695071))
        make_face()
    extrude(amount=-BOSS_EXTRUDE4_DEPTH)


with BuildPart() as body_18:
    # Sketch4 → Boss-Extrude4 2 (new body)
    with BuildSketch(Plane(origin=(0, 35.670907554, 0), x_dir=(1, 0, 0), z_dir=(0, 1, 0))):
        with BuildLine():
            Line((8.718756713, 4.456531193), (9.604485053, 5.601939402))
            ThreePointArc((9.604485053, 5.601939402), (6.729617762, 8.850994462), (2.830227172, 10.752565849))
            Line((2.830227172, 10.752565849), (1.965189818, 9.633914857))
            Line((1.965189818, 9.633914857), (1.635952059, 10.9977961))
            ThreePointArc((1.635952059, 10.9977961), (-2.697251736, 10.786690468), (-6.619823405, 8.933408995))
            Line((-6.619823405, 8.933408995), (-6.287995134, 7.558796444))
            Line((-6.287995134, 7.558796444), (-7.558114424, 8.154922718))
            ThreePointArc((-7.558114424, 8.154922718), (-10.103541037, 4.641801018), (-11.110795116, 0.422007192))
            Line((-11.110795116, 0.422007192), (-9.830682257, -0.178809531))
            Line((-9.830682257, -0.178809531), (-9.79040829, -0.15904215))
            ThreePointArc((-9.79040829, -0.15904215), (-2.369174665, 9.50075788), (8.718756713, 4.456531193))
        make_face()
    extrude(amount=-BOSS_EXTRUDE4_2_DEPTH)


with BuildPart() as body_19:
    # Sketch6 → Revolve7 (revolve)
    with BuildSketch(Plane(origin=(0, 0, 0), x_dir=(0, 0, -1), z_dir=(1, 0, 0))):
        with BuildLine():
            ThreePointArc((10.9977961, 24.088507554), (9.371632058, 17.809459986), (6.02698233, 12.252107554))
            Line((6.02698233, 12.252107554), (6.02698233, 24.088507554))
            Line((6.02698233, 24.088507554), (10.9977961, 24.088507554))
        make_face()
        with BuildLine():
            Line((6.02698233, -11.852492446), (6.02698233, -19.887424982))
            ThreePointArc((6.02698233, -19.887424982), (12.15425901, -16.91231972), (16.714184315, -11.852492446))
            Line((16.714184315, -11.852492446), (6.02698233, -11.852492446))
        make_face()
    revolve(axis=Axis((0, 0, 0), (0, 1, 0)))


solid = Compound([part.part, body_2.part, body_3.part, body_4.part, body_5.part, body_6.part, body_7.part, body_8.part, body_9.part, body_10.part, body_11.part, body_12.part, body_13.part, body_14.part, body_15.part, body_16.part, body_17.part, body_18.part, body_19.part])
